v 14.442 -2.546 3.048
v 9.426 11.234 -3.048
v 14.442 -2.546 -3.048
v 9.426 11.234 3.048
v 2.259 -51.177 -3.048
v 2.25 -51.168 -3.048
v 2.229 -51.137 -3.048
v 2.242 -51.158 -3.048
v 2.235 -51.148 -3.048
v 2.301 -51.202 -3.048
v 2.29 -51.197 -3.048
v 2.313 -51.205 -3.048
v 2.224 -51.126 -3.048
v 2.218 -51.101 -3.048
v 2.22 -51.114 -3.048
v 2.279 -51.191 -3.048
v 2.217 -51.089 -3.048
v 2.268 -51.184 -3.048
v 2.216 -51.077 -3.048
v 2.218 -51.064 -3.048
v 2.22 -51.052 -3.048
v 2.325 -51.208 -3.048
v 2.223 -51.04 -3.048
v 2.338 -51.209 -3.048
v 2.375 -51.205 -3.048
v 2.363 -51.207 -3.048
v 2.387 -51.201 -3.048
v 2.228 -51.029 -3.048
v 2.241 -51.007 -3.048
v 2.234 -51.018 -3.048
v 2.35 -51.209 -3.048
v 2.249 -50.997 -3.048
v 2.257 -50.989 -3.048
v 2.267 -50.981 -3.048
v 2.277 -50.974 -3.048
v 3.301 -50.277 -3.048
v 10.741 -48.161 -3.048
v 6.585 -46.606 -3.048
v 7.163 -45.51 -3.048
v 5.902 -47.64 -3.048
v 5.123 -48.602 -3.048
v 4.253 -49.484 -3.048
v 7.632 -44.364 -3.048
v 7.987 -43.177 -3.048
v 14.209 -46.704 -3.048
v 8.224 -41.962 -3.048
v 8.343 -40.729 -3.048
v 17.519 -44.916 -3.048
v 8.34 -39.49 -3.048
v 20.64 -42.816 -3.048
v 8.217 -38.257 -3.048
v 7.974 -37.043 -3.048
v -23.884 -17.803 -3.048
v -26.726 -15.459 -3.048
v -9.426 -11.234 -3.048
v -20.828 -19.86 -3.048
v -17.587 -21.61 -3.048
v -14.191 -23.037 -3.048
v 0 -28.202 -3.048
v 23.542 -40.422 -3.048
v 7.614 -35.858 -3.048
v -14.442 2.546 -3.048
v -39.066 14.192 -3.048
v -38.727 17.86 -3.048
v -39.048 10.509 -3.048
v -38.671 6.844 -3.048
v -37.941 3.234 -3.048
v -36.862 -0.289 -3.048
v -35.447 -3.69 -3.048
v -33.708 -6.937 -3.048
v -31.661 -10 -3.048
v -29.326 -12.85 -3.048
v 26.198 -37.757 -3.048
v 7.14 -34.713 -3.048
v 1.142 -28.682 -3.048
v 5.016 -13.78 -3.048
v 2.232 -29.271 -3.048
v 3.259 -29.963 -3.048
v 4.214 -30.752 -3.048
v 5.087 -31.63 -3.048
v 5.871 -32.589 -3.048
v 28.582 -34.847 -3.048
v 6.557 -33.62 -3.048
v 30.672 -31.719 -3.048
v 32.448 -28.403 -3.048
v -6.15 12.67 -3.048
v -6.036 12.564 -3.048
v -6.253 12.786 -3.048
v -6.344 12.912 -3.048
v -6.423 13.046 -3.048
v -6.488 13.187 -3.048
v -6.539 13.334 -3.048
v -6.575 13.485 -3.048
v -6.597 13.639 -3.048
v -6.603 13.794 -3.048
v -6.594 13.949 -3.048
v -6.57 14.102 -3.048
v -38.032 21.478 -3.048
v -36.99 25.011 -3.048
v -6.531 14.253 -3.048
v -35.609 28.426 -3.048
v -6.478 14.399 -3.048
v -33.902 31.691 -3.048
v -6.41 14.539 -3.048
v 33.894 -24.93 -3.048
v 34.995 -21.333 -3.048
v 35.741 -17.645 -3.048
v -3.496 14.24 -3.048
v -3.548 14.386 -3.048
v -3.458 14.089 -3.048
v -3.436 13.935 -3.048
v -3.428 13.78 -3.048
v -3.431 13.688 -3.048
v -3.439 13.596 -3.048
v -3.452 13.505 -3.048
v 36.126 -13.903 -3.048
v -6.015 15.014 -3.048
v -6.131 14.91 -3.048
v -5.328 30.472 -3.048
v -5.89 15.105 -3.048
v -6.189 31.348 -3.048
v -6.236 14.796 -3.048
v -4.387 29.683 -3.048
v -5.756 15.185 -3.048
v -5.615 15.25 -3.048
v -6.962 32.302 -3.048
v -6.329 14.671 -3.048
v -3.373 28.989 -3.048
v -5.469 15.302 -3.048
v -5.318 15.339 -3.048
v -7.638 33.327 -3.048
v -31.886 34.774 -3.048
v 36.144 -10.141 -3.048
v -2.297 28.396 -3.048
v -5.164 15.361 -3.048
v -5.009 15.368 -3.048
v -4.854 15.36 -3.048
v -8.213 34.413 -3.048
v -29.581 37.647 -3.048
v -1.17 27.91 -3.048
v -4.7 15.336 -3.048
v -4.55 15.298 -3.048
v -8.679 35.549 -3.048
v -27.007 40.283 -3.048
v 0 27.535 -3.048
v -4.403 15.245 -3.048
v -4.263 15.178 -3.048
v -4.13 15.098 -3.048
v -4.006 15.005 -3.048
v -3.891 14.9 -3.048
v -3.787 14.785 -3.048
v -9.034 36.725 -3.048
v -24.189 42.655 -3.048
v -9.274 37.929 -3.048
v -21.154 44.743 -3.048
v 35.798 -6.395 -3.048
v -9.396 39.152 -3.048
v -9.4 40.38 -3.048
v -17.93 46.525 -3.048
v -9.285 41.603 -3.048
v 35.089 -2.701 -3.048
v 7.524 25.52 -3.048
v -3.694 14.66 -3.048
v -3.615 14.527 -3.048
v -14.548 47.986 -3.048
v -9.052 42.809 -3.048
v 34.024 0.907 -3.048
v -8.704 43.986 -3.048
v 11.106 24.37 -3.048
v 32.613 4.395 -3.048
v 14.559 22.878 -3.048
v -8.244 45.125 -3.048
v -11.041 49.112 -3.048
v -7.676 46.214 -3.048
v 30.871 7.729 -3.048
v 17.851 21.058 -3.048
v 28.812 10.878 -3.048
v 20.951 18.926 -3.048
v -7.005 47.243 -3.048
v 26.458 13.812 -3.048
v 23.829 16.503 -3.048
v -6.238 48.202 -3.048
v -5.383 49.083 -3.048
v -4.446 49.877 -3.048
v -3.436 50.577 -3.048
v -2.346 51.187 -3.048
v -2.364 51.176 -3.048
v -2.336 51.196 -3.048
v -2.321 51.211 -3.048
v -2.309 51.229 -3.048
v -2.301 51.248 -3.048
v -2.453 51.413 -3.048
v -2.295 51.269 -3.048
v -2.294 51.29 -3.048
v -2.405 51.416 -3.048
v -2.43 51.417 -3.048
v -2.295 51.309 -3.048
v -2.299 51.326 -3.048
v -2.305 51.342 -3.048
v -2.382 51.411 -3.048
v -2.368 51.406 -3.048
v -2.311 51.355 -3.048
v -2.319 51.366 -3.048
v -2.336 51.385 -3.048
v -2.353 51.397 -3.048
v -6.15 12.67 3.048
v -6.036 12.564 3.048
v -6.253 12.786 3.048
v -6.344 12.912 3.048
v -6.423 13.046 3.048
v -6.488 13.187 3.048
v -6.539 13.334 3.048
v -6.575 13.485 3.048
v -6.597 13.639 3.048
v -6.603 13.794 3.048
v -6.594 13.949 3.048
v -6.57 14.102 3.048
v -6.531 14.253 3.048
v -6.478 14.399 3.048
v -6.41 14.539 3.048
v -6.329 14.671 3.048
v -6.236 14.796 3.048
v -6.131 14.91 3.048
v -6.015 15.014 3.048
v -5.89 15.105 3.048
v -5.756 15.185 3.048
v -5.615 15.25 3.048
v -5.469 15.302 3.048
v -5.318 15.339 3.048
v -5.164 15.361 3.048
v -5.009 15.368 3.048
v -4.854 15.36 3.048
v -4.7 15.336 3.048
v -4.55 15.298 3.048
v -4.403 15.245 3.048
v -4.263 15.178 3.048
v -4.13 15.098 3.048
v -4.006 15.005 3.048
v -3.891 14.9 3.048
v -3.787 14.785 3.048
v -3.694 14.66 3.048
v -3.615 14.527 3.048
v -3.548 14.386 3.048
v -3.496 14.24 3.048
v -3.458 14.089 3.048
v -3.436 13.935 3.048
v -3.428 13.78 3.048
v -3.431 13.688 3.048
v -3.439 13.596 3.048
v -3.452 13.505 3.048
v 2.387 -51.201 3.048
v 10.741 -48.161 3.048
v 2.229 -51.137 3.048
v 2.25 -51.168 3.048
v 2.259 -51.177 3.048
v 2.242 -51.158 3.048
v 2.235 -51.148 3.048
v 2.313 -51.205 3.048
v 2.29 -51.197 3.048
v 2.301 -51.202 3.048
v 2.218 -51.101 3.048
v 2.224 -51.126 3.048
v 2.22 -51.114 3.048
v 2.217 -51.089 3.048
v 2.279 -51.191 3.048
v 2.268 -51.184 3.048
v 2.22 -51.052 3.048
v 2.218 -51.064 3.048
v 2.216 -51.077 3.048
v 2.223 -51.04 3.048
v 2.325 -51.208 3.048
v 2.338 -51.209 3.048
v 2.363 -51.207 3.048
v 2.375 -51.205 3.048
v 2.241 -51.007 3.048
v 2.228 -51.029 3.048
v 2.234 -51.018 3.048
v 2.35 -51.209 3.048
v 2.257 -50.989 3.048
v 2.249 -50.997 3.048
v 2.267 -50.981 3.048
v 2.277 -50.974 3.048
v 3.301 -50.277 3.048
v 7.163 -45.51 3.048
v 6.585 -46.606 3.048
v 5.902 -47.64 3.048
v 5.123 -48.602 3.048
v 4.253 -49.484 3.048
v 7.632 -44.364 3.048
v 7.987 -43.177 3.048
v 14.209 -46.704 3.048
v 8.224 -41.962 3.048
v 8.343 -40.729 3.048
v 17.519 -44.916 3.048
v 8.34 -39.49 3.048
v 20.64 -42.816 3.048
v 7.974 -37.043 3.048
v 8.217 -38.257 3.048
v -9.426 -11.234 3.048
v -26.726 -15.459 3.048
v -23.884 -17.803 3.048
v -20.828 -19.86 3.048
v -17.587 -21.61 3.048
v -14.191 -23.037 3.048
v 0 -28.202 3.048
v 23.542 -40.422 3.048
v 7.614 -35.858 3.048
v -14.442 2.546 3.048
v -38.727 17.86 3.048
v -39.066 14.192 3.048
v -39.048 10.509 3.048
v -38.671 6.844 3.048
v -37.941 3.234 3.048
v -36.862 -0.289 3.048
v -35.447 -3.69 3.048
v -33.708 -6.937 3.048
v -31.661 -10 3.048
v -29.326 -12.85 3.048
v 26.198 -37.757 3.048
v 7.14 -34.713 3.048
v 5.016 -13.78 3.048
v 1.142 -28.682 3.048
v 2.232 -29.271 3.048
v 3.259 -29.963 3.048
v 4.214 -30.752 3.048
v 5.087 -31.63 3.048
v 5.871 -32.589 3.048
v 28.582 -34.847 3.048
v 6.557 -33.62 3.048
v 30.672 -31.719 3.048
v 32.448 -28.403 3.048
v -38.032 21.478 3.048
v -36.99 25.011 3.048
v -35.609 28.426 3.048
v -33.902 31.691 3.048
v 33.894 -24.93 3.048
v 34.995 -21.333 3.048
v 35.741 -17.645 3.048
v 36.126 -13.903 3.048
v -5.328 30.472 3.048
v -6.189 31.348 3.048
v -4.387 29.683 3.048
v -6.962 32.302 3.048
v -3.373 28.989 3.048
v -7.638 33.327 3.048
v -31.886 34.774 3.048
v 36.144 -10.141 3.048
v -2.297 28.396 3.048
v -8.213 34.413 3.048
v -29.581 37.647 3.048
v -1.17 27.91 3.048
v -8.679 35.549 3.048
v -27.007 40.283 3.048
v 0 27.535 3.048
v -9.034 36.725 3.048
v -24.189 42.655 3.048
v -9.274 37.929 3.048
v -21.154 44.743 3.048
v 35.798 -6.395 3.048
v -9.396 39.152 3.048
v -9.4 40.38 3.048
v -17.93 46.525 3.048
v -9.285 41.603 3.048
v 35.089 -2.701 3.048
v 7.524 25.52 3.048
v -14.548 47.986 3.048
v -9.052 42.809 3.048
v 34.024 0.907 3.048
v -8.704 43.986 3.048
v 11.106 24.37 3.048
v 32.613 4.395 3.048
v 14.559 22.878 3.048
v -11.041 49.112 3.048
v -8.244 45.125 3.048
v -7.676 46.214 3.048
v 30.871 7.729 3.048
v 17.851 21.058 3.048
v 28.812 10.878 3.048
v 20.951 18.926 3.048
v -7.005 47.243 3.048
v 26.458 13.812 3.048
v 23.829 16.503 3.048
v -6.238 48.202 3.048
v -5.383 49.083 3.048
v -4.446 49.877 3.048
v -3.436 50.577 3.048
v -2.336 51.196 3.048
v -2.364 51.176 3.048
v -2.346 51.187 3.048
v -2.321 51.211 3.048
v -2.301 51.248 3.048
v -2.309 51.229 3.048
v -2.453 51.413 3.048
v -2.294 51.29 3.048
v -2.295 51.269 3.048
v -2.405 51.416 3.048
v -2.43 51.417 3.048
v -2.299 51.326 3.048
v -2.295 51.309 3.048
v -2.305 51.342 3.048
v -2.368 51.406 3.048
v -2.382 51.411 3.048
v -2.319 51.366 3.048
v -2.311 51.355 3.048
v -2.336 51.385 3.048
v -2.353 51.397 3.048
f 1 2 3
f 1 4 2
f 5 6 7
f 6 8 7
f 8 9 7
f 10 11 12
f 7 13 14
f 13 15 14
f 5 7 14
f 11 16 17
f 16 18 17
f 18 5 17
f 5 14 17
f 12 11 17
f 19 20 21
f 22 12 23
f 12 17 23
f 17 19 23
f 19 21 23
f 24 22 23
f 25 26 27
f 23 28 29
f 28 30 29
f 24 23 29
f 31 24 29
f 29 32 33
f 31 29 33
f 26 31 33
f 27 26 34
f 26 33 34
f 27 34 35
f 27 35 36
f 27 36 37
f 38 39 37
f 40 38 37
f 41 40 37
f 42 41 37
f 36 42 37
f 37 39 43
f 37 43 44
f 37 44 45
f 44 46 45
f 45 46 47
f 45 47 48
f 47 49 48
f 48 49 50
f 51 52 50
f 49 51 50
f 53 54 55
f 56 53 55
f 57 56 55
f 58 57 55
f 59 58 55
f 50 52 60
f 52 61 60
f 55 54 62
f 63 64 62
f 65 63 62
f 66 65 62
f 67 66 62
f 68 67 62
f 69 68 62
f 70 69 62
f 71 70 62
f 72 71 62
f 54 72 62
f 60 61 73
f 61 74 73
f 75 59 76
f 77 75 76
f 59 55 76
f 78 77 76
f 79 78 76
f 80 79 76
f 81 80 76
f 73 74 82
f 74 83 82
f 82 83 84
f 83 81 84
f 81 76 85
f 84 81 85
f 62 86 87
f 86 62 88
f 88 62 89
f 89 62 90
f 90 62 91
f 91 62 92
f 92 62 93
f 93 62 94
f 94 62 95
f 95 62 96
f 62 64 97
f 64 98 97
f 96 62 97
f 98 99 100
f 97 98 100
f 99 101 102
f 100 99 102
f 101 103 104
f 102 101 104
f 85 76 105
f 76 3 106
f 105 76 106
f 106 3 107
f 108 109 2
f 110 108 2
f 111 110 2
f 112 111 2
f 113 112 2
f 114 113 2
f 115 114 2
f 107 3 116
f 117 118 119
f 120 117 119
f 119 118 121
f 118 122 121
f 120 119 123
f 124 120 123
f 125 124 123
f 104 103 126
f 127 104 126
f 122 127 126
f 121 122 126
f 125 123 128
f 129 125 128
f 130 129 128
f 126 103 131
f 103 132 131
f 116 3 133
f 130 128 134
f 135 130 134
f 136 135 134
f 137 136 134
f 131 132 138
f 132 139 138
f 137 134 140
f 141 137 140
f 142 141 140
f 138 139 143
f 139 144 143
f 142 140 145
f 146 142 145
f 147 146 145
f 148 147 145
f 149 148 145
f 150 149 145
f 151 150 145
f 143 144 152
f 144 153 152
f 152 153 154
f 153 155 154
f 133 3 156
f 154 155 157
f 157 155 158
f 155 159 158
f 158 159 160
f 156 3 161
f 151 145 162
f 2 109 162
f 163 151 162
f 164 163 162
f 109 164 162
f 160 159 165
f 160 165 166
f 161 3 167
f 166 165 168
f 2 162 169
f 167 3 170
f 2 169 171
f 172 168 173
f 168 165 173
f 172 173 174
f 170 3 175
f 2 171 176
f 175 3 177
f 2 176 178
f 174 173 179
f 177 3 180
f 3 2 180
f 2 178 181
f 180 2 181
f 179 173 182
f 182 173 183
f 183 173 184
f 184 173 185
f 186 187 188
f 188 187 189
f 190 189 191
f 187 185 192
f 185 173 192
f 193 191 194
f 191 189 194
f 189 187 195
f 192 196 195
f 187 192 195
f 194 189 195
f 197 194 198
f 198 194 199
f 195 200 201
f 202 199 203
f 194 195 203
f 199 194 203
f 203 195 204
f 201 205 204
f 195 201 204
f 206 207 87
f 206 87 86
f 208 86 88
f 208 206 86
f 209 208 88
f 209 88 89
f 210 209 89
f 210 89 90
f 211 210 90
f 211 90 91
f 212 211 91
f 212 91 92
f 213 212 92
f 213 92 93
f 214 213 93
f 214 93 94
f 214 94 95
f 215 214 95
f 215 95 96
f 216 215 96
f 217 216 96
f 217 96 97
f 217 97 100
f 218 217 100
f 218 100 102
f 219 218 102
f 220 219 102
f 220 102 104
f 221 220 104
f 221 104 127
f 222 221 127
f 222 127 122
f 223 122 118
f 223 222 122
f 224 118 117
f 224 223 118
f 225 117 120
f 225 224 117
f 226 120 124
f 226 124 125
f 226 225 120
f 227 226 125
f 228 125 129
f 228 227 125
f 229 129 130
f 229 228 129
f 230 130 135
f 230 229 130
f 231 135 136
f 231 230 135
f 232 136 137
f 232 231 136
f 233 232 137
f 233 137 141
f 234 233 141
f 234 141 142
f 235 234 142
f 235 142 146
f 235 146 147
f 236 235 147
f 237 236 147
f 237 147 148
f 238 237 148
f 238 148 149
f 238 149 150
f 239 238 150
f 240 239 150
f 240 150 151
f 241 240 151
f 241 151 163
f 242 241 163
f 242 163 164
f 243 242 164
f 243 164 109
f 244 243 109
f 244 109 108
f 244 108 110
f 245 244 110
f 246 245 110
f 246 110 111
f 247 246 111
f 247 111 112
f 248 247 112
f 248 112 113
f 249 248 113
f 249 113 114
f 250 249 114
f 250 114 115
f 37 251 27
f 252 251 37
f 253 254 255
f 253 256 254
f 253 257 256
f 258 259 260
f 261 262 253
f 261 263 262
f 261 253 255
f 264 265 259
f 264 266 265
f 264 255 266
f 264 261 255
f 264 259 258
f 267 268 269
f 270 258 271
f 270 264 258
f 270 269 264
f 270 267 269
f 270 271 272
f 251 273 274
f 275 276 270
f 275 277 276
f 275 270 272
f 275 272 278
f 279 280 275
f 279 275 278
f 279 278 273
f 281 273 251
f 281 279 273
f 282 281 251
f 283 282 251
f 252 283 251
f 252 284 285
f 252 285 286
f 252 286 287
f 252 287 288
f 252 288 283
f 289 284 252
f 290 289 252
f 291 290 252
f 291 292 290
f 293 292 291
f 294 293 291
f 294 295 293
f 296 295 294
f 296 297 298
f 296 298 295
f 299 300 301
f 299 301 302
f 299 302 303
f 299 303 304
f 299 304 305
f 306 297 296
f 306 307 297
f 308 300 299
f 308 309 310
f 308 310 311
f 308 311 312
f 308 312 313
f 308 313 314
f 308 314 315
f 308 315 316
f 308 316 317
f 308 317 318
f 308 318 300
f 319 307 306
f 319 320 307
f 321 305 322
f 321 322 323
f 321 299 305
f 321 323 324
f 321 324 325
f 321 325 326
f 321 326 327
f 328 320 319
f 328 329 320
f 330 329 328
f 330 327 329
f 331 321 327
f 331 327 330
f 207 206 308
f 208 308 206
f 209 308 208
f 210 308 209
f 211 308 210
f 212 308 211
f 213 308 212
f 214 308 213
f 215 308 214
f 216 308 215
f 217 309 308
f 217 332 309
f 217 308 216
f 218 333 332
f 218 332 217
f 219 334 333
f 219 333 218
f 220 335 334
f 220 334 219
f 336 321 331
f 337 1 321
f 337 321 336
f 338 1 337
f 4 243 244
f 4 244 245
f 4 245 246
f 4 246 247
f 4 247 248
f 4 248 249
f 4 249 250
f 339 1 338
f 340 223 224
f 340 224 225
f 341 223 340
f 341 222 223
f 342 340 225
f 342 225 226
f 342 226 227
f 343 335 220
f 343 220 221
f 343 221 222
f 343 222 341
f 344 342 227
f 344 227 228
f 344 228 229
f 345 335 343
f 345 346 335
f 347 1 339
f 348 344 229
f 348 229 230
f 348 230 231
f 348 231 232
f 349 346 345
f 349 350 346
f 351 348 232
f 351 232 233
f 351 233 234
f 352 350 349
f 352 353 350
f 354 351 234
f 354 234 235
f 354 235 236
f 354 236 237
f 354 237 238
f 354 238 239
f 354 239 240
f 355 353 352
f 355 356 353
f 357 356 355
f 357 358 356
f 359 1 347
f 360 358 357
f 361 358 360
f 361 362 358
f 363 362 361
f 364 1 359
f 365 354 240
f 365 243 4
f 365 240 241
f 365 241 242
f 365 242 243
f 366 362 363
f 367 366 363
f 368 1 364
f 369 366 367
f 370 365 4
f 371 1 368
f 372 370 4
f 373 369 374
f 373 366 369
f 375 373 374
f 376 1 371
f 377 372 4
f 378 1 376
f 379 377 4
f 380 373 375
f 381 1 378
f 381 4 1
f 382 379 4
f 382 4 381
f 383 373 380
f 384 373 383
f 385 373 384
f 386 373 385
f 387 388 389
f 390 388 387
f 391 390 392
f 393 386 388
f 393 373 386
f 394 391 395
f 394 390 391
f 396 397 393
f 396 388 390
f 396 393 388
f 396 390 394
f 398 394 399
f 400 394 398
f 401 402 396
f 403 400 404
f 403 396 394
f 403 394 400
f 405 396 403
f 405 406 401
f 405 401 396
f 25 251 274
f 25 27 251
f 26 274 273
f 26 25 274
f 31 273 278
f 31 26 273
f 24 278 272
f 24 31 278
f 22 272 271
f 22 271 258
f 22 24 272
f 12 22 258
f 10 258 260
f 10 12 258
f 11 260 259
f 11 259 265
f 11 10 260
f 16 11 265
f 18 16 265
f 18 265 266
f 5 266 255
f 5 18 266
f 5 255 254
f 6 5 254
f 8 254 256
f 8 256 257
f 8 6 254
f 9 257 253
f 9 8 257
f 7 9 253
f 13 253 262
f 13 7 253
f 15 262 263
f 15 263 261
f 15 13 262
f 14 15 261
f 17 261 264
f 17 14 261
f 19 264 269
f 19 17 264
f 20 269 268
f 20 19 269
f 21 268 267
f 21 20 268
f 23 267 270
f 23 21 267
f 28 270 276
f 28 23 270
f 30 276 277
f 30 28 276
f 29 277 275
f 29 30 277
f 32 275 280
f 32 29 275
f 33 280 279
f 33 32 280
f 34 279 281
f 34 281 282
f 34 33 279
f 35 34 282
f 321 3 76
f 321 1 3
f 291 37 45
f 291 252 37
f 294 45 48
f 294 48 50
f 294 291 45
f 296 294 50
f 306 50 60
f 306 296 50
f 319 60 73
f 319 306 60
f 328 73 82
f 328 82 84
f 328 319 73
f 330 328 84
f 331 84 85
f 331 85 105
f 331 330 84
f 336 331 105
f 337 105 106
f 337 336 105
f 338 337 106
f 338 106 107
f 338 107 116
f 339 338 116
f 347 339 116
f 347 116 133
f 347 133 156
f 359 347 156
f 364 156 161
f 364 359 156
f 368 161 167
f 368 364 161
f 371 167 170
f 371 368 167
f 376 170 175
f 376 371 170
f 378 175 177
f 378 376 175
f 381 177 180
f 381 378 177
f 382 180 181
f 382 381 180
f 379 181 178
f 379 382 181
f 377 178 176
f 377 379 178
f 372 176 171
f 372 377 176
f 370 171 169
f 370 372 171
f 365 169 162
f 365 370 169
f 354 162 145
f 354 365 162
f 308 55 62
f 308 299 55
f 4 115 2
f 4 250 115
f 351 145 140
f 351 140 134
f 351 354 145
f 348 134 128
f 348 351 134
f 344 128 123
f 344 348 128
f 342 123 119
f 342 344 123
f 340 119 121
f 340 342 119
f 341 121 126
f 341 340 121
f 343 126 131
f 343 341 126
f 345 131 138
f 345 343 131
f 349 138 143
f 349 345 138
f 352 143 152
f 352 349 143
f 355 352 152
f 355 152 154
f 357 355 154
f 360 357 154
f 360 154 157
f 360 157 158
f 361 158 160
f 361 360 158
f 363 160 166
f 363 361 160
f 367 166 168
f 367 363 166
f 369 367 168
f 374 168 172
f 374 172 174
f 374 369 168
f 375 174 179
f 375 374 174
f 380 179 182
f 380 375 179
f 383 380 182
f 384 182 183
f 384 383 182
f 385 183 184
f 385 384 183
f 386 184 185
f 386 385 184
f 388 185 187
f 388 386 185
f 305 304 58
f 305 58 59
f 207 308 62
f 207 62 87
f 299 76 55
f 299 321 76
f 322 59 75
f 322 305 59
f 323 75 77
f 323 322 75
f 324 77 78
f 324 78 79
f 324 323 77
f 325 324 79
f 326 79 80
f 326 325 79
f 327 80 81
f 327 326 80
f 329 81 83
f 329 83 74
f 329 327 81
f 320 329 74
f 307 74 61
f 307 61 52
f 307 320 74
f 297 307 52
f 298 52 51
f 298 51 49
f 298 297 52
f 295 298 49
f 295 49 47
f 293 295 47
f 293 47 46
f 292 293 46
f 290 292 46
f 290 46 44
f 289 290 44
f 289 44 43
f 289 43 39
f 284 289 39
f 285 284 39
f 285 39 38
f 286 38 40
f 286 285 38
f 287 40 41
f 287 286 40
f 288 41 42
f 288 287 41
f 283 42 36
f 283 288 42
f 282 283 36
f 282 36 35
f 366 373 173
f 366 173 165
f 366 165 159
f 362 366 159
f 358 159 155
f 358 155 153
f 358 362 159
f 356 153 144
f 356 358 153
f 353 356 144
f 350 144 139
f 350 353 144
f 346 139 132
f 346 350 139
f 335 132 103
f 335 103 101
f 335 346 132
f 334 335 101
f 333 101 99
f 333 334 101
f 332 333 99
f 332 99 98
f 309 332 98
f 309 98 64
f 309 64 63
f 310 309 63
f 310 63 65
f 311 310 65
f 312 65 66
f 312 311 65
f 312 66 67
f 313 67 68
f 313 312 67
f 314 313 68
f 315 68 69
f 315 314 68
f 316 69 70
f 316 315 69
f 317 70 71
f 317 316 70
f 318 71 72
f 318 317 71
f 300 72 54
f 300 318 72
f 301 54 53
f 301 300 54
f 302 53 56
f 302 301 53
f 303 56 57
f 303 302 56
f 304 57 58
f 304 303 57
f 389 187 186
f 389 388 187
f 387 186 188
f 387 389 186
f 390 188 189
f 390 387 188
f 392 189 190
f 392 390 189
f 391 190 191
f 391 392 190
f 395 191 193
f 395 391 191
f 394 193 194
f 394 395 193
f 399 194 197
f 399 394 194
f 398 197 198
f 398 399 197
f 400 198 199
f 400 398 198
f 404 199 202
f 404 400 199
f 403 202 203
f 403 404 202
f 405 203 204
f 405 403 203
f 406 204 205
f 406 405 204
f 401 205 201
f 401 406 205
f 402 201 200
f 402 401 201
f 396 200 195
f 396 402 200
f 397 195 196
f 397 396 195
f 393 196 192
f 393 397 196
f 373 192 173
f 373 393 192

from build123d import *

# Parameters (mm, degrees)
BOSS_EXTRUDE1_DEPTH = 3.048
FILLET1_R           = 0.127


with BuildPart() as part:
    # Sketch1 → Boss-Extrude1 (new body, symmetric)
    with BuildSketch(Plane.XY):
        with BuildLine():
            ThreePointArc((0, 27.535484012), (-9.412998127, 39.802742006), (0, 52.07))
            Line((0, 52.07), (-11.040532194, 49.111698314))
            ThreePointArc((-11.040532194, 49.111698314), (-39.066320922, 14.192289272), (-14.190605813, -23.03684931))
            Line((-14.190605813, -23.03684931), (0, -28.201807432))
            ThreePointArc((0, -28.201807432), (8.35634418, -40.135903716), (0, -52.07))
            Line((0, -52.07), (10.740686656, -48.160709762))
            ThreePointArc((10.740686656, -48.160709762), (36.144496882, -10.141220984), (7.52373904, 25.519504212))
            Line((7.52373904, 25.519504212), (0, 27.535484012))
        make_face()
        with BuildLine():
            Line((-14.441907141, 2.546497882), (-6.036047045, 12.564211851))
            ThreePointArc((-6.036047045, 12.564211851), (-5.686528205, 15.219071016), (-3.428121714, 13.780307404))
            ThreePointArc((-3.428121714, 13.780307404), (-3.434162631, 13.641947663), (-3.452239406, 13.504640922))
            Line((-3.452239406, 13.504640922), (9.426285427, 11.233809522))
            Line((9.426285427, 11.233809522), (14.441907141, -2.546497882))
            Line((14.441907141, -2.546497882), (5.015621714, -13.780307404))
            Line((5.015621714, -13.780307404), (-9.426285427, -11.233809522))
            Line((-9.426285427, -11.233809522), (-14.441907141, 2.546497882))
        make_face(mode=Mode.SUBTRACT)
    extrude(amount=BOSS_EXTRUDE1_DEPTH, both=True)

    # Fillet1
    fillet1_edges = [part.edges().sort_by_distance(p)[0] for p in [
        (0, 52.07, 0),
        (0, -52.07, 0),
    ]]
    fillet(fillet1_edges, radius=FILLET1_R)


solid = part.part
